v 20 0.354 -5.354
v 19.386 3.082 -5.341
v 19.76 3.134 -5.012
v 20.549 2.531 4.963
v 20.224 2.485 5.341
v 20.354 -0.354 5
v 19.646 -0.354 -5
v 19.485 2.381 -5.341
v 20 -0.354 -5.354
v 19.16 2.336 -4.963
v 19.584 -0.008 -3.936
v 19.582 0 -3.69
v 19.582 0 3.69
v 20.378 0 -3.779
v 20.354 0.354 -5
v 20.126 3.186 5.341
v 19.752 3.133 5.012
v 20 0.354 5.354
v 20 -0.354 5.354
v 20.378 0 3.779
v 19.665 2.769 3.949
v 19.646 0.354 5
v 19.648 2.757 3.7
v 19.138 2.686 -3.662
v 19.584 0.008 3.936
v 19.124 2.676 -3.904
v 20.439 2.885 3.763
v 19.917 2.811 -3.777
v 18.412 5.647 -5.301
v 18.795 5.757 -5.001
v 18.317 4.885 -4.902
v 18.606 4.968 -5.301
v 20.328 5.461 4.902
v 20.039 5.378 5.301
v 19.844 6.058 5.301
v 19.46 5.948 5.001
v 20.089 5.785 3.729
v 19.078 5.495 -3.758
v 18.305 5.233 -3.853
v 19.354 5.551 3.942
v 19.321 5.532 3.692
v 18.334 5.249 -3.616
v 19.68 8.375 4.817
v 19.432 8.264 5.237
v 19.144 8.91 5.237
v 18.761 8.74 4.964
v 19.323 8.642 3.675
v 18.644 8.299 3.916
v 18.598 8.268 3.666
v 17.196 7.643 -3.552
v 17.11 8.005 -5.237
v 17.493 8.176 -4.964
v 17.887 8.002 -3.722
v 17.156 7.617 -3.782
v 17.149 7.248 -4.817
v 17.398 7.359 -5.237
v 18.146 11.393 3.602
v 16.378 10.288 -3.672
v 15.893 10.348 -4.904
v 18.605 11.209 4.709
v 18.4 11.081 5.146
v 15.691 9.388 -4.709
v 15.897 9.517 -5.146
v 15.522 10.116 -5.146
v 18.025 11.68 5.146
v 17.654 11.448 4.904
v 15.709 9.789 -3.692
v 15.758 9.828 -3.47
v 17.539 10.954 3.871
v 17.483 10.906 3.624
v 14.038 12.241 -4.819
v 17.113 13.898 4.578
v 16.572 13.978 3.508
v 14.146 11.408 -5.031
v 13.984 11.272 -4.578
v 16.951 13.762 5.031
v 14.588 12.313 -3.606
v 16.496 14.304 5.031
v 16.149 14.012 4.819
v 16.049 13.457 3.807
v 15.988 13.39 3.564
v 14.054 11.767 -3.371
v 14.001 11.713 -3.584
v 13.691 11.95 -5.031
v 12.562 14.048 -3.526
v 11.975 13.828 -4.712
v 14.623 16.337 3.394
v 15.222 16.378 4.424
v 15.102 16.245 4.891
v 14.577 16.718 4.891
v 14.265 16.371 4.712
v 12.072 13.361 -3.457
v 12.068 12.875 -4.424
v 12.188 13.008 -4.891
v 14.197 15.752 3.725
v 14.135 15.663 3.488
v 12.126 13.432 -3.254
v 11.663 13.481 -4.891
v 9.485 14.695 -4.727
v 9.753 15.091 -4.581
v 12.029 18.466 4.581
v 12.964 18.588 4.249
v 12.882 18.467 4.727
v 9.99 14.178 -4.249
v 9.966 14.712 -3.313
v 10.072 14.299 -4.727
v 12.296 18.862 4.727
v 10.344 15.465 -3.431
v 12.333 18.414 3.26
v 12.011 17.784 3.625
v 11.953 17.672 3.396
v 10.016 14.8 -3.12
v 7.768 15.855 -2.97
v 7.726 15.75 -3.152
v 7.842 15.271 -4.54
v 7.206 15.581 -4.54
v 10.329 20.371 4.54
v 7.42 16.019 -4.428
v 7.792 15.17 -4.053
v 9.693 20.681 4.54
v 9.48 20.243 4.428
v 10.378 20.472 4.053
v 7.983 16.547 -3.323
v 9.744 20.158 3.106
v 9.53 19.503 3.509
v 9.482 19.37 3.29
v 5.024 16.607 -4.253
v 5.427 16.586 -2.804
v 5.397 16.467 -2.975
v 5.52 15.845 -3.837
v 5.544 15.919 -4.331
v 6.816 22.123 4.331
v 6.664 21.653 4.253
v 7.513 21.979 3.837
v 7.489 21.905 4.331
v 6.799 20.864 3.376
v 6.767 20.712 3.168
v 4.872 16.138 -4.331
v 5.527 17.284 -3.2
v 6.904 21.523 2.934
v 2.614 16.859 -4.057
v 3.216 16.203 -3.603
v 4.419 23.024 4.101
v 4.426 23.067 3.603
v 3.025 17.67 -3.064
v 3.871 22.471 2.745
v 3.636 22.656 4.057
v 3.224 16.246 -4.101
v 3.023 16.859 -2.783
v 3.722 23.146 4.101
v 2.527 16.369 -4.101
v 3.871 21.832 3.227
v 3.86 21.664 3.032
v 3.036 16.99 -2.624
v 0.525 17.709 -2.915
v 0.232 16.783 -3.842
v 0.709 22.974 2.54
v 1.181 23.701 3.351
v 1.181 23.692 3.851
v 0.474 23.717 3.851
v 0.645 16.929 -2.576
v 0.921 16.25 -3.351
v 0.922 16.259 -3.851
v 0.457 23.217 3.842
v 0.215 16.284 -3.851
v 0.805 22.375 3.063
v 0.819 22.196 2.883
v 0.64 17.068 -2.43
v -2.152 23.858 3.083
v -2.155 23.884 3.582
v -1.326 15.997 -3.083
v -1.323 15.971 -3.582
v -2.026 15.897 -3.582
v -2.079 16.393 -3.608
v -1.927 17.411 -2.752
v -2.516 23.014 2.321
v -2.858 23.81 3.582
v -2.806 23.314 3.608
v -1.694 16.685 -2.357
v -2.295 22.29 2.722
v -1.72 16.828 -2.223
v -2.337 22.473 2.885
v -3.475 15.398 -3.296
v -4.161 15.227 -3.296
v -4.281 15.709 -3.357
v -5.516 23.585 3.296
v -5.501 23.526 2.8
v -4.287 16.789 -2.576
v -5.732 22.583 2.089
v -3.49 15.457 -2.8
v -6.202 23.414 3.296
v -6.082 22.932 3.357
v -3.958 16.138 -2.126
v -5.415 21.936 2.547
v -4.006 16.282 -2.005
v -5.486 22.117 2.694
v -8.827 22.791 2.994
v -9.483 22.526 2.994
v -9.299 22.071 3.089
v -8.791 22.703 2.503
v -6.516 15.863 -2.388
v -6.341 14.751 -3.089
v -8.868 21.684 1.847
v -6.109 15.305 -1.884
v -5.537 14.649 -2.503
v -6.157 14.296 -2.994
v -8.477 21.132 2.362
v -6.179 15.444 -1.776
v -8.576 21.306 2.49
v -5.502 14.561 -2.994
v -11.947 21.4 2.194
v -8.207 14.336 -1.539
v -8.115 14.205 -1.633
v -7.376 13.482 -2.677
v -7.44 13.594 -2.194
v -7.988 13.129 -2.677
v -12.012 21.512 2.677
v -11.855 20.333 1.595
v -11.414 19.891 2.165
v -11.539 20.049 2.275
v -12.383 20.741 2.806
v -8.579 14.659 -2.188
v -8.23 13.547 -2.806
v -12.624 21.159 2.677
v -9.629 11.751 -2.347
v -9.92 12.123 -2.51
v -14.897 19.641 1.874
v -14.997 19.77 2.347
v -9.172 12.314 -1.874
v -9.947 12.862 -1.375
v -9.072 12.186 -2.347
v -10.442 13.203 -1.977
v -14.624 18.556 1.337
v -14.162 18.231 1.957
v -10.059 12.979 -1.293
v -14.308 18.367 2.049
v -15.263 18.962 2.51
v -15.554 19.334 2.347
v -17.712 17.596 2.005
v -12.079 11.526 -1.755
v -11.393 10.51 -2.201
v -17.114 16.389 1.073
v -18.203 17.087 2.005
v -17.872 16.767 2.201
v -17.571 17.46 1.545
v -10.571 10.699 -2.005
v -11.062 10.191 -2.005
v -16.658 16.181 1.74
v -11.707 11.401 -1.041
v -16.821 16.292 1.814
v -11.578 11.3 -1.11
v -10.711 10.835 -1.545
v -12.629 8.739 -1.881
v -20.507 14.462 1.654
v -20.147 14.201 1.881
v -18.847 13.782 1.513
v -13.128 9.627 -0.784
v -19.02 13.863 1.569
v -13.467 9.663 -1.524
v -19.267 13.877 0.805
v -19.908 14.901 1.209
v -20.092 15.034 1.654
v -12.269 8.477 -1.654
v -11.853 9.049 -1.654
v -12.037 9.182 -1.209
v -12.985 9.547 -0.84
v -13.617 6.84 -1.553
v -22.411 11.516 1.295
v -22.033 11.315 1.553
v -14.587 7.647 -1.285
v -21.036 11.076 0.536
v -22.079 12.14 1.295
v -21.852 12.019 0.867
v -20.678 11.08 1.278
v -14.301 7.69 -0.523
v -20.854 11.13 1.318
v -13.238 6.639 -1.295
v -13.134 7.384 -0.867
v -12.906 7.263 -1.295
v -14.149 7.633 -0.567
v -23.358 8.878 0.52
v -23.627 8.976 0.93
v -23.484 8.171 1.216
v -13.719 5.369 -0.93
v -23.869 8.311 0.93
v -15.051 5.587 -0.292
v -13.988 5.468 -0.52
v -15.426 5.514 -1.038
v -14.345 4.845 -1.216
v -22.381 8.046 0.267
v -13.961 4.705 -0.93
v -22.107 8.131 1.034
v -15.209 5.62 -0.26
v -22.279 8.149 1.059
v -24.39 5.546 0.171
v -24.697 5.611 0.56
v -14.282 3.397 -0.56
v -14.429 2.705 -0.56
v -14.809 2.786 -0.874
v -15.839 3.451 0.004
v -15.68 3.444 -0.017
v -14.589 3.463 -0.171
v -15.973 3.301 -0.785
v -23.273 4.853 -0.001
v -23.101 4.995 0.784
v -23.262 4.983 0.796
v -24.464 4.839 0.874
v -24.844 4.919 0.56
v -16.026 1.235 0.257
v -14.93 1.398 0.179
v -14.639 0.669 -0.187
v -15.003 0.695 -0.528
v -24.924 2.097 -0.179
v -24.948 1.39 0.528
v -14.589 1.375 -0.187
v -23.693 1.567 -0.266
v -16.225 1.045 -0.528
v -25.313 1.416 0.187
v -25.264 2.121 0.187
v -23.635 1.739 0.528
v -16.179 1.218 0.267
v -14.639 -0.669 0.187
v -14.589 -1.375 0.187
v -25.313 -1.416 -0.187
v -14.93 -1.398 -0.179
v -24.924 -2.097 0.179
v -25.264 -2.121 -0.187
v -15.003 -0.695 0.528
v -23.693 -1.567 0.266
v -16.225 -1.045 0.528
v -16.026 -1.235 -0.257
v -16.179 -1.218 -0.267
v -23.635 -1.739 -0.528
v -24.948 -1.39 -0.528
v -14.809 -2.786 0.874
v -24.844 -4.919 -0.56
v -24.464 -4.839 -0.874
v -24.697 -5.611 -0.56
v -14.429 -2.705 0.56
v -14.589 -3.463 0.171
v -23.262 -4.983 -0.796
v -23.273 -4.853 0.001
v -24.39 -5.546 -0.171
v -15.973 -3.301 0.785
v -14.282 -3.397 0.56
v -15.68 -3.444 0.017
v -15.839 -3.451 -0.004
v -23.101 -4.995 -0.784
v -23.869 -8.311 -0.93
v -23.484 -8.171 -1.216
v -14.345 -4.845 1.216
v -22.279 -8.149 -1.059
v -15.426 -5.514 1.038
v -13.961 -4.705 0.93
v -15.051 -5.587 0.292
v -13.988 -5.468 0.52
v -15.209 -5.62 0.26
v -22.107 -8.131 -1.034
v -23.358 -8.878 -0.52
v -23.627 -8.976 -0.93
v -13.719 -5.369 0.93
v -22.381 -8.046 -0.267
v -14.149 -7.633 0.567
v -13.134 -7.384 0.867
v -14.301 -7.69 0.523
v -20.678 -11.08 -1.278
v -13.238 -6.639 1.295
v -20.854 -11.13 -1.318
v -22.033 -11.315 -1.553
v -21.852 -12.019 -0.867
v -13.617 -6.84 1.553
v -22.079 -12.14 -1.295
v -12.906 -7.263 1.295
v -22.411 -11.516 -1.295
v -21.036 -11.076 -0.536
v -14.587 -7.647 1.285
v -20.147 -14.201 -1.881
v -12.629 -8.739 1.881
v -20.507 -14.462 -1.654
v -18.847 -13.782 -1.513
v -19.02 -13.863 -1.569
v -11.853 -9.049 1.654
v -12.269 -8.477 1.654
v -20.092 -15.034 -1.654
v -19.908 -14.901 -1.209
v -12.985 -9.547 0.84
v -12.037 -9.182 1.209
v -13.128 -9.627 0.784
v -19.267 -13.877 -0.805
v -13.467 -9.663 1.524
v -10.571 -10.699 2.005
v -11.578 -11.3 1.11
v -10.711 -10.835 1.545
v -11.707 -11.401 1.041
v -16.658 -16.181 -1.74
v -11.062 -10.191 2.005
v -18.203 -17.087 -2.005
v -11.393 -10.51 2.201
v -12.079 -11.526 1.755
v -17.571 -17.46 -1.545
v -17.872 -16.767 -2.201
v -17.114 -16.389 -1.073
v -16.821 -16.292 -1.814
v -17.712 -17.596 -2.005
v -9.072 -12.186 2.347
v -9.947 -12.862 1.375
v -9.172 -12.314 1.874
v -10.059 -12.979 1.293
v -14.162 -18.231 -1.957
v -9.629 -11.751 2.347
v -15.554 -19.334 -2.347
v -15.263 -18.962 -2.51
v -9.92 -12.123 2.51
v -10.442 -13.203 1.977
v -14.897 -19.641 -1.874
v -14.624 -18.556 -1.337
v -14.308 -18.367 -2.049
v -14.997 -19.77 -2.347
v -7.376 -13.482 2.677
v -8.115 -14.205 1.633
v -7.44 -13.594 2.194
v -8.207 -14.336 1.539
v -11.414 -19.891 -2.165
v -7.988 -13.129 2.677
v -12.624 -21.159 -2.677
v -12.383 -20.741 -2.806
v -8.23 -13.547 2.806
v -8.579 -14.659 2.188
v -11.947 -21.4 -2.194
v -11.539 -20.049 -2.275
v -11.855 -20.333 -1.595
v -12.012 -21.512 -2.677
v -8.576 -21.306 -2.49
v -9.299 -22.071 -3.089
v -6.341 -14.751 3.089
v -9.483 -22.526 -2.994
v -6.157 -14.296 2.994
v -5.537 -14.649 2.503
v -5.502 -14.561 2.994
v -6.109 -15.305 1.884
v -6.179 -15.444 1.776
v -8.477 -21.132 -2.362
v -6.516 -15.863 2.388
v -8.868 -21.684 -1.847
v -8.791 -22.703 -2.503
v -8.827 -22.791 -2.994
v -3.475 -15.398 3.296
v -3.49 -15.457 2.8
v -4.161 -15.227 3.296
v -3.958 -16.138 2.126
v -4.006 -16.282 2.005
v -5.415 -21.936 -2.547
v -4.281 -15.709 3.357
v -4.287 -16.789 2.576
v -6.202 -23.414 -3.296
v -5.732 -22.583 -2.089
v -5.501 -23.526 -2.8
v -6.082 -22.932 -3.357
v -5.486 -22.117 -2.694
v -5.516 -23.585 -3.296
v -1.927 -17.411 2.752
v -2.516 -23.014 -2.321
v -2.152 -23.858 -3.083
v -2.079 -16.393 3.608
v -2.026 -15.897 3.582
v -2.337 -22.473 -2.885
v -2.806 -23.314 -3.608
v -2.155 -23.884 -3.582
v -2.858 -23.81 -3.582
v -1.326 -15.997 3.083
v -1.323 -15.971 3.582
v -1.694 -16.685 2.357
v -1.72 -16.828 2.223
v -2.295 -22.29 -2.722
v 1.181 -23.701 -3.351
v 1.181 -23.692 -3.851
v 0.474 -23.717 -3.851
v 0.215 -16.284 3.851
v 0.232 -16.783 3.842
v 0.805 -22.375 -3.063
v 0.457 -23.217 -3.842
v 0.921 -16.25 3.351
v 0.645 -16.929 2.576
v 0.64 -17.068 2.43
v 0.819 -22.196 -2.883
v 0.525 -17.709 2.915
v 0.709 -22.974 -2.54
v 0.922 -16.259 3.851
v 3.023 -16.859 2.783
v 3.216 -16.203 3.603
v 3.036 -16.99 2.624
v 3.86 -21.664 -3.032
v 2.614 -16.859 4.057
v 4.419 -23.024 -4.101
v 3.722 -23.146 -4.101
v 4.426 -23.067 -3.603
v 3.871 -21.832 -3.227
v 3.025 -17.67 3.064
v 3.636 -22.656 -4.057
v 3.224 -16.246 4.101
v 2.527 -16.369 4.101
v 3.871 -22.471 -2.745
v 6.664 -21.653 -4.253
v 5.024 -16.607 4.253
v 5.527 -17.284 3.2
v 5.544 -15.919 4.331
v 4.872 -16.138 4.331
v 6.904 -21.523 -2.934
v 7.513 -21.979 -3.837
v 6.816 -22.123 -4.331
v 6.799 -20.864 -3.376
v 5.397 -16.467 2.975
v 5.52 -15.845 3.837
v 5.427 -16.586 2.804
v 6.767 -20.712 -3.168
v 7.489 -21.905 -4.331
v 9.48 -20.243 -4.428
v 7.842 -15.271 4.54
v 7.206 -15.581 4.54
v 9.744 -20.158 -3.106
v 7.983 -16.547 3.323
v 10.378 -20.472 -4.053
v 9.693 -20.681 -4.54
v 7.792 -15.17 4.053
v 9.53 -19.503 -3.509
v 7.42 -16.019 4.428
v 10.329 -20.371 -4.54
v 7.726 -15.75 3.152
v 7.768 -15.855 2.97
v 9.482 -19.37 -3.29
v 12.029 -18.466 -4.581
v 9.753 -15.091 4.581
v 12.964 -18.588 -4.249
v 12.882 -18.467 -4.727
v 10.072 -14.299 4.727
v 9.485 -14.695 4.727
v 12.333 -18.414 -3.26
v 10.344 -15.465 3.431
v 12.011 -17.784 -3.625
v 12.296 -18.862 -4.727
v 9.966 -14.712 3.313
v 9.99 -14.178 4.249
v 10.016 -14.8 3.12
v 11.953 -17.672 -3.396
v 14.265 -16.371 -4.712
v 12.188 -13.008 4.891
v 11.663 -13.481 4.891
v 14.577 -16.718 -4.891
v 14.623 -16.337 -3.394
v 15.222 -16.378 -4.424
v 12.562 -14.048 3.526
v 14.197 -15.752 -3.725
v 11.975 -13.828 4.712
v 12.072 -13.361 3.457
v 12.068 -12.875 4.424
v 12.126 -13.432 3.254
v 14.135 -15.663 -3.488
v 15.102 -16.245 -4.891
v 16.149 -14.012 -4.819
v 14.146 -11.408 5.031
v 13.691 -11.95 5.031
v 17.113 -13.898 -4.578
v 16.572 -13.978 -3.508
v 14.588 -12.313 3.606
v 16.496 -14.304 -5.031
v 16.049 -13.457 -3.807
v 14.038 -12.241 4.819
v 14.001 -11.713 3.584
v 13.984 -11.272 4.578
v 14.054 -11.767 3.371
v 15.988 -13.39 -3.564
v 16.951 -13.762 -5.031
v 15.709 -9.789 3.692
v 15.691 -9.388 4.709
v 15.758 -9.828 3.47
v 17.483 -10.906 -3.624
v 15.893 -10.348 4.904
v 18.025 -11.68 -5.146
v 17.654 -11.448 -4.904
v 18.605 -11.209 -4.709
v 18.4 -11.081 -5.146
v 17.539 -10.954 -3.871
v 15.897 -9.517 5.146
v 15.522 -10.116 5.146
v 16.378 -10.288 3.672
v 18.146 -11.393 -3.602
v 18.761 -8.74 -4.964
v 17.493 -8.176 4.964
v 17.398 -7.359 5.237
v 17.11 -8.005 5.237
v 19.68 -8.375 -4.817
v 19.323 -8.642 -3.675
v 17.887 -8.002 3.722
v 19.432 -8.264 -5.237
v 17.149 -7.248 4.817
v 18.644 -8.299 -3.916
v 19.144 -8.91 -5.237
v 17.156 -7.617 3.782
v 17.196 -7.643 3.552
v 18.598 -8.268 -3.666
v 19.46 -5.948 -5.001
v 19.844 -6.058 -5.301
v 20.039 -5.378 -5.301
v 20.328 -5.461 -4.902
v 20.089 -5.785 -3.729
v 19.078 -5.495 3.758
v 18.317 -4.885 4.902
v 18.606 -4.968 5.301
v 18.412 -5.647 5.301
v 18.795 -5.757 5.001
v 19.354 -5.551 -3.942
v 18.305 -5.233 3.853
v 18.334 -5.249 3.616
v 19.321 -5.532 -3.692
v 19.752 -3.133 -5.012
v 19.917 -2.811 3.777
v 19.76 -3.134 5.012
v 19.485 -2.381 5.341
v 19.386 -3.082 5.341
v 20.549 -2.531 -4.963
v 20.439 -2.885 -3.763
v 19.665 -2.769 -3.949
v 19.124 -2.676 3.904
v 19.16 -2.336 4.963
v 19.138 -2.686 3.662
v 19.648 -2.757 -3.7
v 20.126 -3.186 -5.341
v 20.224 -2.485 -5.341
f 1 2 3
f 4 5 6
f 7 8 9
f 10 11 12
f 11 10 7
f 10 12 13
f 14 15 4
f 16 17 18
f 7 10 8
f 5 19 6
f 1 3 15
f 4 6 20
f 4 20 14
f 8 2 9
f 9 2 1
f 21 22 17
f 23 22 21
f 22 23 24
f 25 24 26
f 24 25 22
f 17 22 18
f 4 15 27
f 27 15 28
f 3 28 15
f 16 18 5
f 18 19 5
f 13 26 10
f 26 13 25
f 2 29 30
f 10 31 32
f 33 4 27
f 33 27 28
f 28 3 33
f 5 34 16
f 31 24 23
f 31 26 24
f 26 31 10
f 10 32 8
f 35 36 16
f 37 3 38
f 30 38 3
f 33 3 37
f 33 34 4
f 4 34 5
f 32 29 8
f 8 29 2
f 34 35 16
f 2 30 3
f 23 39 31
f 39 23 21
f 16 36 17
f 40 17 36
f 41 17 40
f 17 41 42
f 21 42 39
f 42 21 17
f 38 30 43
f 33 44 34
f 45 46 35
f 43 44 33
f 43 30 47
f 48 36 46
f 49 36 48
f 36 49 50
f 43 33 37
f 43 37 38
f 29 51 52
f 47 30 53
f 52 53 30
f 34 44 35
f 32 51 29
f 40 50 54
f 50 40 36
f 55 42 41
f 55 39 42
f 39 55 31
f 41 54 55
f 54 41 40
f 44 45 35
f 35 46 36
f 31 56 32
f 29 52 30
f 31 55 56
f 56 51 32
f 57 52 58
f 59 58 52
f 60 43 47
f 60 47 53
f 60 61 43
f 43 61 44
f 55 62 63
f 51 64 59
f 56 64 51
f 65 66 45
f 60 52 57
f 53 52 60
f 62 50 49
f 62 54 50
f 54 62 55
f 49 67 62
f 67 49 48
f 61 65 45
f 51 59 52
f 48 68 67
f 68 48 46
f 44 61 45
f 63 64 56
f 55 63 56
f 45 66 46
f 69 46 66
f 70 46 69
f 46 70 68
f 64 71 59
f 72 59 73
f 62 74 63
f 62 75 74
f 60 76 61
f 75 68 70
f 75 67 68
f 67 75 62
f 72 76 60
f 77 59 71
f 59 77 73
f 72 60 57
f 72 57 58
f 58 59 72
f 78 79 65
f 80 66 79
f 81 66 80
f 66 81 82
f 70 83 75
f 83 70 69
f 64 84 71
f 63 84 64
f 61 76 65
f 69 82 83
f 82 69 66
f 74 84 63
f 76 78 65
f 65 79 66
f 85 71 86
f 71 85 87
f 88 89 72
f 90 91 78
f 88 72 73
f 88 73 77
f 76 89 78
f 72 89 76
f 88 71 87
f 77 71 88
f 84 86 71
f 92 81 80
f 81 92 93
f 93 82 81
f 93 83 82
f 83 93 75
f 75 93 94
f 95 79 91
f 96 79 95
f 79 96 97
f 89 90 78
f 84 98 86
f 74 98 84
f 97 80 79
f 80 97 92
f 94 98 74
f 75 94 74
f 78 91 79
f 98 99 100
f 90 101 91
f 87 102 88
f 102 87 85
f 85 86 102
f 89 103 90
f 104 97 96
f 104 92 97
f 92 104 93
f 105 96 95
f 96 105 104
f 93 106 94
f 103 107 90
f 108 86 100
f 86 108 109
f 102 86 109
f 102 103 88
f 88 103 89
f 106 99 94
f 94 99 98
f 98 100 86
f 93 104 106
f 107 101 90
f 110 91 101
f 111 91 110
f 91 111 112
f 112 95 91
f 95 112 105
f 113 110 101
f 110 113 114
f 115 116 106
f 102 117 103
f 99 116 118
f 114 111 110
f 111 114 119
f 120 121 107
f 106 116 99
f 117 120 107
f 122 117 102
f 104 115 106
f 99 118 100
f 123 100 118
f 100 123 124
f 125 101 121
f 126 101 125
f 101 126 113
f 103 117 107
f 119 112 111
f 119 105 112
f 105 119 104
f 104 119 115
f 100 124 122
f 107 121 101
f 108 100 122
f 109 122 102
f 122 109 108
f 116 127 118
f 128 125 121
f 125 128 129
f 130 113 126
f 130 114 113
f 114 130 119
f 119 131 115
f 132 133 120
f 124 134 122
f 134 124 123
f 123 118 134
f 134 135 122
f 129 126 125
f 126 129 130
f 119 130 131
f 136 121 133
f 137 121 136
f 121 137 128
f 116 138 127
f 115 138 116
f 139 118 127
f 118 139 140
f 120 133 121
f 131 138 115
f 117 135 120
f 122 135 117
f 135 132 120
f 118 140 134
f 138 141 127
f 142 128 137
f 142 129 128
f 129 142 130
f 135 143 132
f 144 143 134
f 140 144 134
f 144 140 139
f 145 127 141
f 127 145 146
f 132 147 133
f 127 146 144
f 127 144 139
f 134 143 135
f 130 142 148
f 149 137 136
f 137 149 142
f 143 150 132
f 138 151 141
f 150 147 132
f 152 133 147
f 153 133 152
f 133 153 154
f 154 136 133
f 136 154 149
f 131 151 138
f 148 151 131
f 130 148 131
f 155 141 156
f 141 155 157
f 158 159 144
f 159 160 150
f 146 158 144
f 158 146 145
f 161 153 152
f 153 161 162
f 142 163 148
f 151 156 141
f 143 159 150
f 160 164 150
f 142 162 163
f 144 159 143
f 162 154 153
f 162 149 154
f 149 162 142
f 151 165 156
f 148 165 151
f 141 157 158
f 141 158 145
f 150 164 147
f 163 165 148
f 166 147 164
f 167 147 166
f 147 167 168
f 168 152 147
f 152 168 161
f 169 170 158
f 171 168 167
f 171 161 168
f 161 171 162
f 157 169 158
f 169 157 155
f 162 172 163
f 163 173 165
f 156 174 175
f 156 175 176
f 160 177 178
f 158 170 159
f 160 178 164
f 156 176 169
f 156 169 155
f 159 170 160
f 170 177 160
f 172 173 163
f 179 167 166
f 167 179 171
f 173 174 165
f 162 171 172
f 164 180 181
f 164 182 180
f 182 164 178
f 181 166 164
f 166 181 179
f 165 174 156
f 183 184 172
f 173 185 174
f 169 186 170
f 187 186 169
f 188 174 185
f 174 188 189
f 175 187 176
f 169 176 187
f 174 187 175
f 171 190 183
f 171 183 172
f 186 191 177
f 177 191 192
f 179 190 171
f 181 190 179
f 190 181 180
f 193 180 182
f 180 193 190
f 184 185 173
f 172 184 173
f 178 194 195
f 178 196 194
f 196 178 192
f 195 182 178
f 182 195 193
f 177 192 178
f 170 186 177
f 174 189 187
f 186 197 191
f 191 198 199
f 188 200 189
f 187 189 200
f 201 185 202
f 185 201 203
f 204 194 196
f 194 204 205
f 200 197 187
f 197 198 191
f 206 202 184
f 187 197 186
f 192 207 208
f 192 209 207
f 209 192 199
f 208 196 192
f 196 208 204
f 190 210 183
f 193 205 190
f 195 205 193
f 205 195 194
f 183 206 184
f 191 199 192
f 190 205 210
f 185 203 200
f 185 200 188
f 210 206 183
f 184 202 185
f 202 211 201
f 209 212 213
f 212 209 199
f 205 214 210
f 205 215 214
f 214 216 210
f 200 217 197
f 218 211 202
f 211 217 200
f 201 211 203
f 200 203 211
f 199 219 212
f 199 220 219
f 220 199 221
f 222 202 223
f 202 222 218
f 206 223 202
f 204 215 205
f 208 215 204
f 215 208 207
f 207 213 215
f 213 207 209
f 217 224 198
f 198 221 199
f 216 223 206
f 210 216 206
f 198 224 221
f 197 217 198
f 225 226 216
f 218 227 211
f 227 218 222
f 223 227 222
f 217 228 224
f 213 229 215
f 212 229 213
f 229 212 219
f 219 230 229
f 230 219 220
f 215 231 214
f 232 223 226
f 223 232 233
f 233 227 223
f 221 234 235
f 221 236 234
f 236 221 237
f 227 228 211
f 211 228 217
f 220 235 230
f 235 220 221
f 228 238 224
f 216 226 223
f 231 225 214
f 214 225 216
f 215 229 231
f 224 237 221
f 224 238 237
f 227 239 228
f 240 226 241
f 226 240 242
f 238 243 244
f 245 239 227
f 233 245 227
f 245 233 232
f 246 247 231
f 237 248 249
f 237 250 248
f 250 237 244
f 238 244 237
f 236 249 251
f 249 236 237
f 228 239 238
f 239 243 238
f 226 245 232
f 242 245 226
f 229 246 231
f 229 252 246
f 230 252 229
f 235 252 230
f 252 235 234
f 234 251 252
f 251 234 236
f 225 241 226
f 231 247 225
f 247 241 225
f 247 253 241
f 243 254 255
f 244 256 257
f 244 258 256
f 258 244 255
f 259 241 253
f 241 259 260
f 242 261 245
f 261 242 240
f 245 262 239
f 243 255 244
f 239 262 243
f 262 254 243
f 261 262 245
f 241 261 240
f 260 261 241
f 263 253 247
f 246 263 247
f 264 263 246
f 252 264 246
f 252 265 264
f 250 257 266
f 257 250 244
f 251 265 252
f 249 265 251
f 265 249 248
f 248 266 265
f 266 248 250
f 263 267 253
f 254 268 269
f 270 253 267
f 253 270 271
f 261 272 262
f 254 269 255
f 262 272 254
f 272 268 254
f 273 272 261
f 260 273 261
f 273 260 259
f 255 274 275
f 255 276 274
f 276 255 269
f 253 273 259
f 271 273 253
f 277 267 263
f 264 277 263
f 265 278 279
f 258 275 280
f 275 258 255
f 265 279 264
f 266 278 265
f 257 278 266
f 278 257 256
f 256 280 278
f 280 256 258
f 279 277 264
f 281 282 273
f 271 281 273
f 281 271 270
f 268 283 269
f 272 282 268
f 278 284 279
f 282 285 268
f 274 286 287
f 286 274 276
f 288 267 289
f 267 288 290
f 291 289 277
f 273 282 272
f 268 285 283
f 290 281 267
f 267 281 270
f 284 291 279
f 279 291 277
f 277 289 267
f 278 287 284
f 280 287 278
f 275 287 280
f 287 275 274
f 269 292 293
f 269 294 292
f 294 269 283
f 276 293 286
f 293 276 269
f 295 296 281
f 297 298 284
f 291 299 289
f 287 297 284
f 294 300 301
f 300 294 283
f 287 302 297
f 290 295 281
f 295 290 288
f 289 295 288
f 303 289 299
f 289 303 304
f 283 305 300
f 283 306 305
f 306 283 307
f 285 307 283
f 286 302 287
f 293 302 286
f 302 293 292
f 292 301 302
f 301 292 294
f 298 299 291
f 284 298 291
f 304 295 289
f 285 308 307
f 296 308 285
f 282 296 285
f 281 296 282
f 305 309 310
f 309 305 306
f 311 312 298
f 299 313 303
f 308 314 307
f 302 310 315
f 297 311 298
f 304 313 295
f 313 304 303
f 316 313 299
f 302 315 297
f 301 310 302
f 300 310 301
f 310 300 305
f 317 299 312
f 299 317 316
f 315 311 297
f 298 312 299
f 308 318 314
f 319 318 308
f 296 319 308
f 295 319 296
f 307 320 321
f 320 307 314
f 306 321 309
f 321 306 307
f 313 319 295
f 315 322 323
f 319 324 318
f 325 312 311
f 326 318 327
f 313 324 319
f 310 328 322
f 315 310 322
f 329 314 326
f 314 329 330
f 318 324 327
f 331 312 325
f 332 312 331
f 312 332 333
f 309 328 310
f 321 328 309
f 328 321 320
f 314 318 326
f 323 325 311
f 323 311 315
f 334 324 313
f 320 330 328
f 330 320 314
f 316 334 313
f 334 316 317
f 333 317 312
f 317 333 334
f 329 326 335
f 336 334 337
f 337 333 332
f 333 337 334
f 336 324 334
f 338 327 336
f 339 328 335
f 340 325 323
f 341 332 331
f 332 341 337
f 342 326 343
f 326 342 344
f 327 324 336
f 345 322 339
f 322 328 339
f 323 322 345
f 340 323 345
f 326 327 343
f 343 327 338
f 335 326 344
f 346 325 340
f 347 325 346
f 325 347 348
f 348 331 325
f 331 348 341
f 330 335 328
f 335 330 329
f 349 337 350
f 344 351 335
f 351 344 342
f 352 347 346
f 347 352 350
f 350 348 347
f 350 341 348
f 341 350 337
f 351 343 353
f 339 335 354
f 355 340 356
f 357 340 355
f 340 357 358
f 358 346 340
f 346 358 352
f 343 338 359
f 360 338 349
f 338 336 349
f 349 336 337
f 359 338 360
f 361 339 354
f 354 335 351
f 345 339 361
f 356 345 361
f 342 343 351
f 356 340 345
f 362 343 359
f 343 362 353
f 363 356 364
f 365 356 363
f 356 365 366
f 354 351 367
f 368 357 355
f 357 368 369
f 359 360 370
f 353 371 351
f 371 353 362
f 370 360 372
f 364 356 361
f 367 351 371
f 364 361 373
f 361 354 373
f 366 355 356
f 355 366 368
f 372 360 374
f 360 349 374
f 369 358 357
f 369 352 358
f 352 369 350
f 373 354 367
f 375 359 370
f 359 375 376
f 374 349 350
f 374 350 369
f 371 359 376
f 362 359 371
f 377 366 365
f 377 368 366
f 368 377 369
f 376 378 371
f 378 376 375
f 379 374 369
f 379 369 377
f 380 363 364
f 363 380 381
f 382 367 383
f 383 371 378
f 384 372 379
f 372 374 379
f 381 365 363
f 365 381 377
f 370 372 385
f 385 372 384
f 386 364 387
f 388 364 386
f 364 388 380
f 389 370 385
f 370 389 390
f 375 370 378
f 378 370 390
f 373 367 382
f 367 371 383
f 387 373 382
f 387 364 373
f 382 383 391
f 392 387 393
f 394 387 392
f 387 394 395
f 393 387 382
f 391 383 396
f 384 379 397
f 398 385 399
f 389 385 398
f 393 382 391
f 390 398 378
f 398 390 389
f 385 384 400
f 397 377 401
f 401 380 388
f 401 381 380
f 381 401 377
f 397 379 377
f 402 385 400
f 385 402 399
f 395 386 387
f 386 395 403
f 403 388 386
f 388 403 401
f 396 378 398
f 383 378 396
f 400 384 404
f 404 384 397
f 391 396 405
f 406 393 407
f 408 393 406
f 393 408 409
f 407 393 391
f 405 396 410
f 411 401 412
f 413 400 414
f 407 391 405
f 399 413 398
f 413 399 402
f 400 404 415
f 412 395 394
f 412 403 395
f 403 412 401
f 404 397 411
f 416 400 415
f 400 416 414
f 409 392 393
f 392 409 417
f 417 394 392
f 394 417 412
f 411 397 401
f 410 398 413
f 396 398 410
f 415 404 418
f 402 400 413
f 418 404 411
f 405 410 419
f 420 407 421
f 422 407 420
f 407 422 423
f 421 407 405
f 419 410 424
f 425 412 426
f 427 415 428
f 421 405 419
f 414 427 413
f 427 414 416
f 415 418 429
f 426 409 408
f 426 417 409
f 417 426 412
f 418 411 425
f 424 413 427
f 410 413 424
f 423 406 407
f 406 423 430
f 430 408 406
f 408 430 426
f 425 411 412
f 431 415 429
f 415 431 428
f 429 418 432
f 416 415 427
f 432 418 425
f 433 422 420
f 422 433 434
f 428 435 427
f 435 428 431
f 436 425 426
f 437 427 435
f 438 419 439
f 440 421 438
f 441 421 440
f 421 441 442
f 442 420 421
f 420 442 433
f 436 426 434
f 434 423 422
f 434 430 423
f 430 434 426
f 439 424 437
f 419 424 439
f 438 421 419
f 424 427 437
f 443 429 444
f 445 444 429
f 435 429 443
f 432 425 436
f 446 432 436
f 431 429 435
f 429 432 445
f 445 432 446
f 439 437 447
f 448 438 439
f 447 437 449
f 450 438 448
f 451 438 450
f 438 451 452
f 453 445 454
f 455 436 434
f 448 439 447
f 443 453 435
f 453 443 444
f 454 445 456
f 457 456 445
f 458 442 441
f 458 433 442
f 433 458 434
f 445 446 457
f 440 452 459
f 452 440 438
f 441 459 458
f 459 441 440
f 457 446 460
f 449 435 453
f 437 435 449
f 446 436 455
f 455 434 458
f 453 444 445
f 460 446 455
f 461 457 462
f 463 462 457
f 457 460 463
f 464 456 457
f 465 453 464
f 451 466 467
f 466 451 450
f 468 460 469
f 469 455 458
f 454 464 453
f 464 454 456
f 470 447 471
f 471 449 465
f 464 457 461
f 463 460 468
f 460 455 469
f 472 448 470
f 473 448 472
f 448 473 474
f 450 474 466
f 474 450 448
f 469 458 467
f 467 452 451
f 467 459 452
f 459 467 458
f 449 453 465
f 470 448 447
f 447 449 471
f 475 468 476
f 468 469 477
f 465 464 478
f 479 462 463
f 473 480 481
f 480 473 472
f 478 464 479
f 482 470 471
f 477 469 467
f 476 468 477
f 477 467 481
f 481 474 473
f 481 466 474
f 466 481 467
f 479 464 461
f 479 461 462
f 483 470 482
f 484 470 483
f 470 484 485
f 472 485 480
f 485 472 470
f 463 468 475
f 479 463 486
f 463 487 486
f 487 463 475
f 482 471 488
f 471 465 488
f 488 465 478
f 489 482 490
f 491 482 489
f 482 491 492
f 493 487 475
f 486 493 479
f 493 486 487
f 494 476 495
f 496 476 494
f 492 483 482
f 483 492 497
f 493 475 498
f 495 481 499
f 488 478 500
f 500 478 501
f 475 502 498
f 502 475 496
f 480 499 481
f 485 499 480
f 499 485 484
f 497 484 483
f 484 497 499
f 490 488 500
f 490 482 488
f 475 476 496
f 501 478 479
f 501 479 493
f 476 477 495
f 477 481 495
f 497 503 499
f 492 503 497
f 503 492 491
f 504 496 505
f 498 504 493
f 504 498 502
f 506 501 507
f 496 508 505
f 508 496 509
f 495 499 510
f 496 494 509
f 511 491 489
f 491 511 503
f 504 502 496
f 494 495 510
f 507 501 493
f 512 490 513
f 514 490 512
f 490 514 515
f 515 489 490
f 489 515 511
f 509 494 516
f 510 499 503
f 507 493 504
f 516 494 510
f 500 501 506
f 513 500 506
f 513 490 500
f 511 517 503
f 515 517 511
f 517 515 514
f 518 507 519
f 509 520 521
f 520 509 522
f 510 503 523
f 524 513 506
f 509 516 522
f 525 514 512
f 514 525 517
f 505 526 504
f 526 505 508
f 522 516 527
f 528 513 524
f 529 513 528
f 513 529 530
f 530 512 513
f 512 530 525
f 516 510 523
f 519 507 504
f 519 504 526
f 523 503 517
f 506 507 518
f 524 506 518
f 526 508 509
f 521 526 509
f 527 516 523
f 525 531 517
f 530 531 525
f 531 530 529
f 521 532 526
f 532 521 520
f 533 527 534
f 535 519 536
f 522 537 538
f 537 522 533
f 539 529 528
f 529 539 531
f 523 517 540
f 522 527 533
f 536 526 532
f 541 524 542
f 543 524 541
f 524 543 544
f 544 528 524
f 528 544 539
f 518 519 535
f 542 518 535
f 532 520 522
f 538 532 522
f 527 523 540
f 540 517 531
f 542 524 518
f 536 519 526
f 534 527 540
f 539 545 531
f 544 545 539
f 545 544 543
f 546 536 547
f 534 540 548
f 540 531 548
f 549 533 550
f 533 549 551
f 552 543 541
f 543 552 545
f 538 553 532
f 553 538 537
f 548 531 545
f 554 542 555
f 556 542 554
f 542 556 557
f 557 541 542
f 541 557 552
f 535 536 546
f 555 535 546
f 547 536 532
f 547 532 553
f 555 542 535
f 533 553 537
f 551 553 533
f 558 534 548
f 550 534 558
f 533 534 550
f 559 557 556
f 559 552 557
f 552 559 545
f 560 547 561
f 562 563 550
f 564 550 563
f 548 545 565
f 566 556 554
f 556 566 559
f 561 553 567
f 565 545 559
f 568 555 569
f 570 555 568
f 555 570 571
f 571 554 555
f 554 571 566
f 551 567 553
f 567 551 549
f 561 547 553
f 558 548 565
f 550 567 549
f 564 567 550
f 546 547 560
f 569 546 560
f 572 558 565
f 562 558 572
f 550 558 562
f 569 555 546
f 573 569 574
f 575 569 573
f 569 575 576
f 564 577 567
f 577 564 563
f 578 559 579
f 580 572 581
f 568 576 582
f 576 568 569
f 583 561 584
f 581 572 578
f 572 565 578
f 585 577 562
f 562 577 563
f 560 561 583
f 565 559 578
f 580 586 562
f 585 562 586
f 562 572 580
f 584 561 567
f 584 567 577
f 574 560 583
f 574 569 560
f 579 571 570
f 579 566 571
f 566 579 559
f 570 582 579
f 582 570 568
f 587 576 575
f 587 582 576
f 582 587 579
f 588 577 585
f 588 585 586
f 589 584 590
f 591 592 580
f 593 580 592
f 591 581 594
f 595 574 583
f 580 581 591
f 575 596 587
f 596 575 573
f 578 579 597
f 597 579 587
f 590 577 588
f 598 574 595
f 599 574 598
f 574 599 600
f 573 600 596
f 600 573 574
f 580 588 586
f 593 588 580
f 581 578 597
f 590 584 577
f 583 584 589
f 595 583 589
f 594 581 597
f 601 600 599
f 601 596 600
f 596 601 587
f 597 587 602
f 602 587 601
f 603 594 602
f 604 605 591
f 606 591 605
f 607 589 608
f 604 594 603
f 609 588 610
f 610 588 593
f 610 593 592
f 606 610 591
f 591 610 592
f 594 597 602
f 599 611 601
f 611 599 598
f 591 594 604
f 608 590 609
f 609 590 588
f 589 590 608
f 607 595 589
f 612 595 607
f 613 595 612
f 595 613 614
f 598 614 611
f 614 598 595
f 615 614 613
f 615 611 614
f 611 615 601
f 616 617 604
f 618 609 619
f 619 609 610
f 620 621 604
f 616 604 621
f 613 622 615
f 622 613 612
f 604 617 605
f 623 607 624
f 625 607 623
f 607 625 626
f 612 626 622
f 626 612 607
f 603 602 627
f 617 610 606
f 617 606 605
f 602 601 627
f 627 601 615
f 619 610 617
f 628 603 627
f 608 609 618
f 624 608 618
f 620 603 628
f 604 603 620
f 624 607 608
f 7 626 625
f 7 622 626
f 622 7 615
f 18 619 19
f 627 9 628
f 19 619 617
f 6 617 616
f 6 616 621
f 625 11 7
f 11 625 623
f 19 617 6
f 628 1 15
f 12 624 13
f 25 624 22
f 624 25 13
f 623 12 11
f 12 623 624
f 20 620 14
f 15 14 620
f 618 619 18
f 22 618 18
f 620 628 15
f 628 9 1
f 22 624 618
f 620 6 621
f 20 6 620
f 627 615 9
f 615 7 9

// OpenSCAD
//
//        __    
//       /\ \            Moebius v2 by 
//      / /\ \           Vanlindt Marc
//     / /  \ \          Licence GNU GPL V3
//    / /____\_\ 
//    \/_______/ 
//
//

nombresections 		= 45;	// nombre de divisions de la forme
rayon 			= 10;	// Rayon...
nbrcotes 		= 2;		// Nombre de côtés de la forme
tours                   = 1;	// Nombre de tours effectués.




//Exemples : (décommentez la ligne de l'exemple voulu)
//nombresections=90;rayon=10;nbrcotes=4;nbrtour=1/2;
//nombresections=180;rayon=12;nbrcotes=4;nbrtour=2;
//nombresections=360;rayon=12;nbrcotes=4;nbrtour=4;
//nombresections=30;rayon=10;nbrcotes=3;nbrtour=1/3;
//nombresections=30;rayon=10;nbrcotes=3;nbrtour=1/3;
//nombresections=45;rayon=5;nbrcotes=5;nbrtour=3/5;


nbrtour 		= tours/nbrcotes;
moebius();



module moebius()
{
    union()
    {
    	for (i=[0:nombresections])
        {
            union()
            {
                hull()
            	{
                    rotate ([0,0,i*360/nombresections])
                    translate ([20,0,0])
                    rotate([90,i*360*nbrtour/nombresections,0])
                    for(i=[1:nbrcotes])
                    {
                        rotate([0,0,360/nbrcotes*i])
                        translate([0,rayon/2,0])
                        sphere(d=1,$fn=4);
                    }
                    rotate ([0,0,(i+1)*360/nombresections])
                    translate ([20,0,0])
                    rotate([90,(i+1)*360*nbrtour/nombresections,0])
                    for(i=[1:nbrcotes])
                    {
                        rotate([0,0,360/nbrcotes*i])
                        translate([0,rayon/2,0])
                        sphere(d=1,$fn=4);
                    }
                }
            }
        }
    }
}
